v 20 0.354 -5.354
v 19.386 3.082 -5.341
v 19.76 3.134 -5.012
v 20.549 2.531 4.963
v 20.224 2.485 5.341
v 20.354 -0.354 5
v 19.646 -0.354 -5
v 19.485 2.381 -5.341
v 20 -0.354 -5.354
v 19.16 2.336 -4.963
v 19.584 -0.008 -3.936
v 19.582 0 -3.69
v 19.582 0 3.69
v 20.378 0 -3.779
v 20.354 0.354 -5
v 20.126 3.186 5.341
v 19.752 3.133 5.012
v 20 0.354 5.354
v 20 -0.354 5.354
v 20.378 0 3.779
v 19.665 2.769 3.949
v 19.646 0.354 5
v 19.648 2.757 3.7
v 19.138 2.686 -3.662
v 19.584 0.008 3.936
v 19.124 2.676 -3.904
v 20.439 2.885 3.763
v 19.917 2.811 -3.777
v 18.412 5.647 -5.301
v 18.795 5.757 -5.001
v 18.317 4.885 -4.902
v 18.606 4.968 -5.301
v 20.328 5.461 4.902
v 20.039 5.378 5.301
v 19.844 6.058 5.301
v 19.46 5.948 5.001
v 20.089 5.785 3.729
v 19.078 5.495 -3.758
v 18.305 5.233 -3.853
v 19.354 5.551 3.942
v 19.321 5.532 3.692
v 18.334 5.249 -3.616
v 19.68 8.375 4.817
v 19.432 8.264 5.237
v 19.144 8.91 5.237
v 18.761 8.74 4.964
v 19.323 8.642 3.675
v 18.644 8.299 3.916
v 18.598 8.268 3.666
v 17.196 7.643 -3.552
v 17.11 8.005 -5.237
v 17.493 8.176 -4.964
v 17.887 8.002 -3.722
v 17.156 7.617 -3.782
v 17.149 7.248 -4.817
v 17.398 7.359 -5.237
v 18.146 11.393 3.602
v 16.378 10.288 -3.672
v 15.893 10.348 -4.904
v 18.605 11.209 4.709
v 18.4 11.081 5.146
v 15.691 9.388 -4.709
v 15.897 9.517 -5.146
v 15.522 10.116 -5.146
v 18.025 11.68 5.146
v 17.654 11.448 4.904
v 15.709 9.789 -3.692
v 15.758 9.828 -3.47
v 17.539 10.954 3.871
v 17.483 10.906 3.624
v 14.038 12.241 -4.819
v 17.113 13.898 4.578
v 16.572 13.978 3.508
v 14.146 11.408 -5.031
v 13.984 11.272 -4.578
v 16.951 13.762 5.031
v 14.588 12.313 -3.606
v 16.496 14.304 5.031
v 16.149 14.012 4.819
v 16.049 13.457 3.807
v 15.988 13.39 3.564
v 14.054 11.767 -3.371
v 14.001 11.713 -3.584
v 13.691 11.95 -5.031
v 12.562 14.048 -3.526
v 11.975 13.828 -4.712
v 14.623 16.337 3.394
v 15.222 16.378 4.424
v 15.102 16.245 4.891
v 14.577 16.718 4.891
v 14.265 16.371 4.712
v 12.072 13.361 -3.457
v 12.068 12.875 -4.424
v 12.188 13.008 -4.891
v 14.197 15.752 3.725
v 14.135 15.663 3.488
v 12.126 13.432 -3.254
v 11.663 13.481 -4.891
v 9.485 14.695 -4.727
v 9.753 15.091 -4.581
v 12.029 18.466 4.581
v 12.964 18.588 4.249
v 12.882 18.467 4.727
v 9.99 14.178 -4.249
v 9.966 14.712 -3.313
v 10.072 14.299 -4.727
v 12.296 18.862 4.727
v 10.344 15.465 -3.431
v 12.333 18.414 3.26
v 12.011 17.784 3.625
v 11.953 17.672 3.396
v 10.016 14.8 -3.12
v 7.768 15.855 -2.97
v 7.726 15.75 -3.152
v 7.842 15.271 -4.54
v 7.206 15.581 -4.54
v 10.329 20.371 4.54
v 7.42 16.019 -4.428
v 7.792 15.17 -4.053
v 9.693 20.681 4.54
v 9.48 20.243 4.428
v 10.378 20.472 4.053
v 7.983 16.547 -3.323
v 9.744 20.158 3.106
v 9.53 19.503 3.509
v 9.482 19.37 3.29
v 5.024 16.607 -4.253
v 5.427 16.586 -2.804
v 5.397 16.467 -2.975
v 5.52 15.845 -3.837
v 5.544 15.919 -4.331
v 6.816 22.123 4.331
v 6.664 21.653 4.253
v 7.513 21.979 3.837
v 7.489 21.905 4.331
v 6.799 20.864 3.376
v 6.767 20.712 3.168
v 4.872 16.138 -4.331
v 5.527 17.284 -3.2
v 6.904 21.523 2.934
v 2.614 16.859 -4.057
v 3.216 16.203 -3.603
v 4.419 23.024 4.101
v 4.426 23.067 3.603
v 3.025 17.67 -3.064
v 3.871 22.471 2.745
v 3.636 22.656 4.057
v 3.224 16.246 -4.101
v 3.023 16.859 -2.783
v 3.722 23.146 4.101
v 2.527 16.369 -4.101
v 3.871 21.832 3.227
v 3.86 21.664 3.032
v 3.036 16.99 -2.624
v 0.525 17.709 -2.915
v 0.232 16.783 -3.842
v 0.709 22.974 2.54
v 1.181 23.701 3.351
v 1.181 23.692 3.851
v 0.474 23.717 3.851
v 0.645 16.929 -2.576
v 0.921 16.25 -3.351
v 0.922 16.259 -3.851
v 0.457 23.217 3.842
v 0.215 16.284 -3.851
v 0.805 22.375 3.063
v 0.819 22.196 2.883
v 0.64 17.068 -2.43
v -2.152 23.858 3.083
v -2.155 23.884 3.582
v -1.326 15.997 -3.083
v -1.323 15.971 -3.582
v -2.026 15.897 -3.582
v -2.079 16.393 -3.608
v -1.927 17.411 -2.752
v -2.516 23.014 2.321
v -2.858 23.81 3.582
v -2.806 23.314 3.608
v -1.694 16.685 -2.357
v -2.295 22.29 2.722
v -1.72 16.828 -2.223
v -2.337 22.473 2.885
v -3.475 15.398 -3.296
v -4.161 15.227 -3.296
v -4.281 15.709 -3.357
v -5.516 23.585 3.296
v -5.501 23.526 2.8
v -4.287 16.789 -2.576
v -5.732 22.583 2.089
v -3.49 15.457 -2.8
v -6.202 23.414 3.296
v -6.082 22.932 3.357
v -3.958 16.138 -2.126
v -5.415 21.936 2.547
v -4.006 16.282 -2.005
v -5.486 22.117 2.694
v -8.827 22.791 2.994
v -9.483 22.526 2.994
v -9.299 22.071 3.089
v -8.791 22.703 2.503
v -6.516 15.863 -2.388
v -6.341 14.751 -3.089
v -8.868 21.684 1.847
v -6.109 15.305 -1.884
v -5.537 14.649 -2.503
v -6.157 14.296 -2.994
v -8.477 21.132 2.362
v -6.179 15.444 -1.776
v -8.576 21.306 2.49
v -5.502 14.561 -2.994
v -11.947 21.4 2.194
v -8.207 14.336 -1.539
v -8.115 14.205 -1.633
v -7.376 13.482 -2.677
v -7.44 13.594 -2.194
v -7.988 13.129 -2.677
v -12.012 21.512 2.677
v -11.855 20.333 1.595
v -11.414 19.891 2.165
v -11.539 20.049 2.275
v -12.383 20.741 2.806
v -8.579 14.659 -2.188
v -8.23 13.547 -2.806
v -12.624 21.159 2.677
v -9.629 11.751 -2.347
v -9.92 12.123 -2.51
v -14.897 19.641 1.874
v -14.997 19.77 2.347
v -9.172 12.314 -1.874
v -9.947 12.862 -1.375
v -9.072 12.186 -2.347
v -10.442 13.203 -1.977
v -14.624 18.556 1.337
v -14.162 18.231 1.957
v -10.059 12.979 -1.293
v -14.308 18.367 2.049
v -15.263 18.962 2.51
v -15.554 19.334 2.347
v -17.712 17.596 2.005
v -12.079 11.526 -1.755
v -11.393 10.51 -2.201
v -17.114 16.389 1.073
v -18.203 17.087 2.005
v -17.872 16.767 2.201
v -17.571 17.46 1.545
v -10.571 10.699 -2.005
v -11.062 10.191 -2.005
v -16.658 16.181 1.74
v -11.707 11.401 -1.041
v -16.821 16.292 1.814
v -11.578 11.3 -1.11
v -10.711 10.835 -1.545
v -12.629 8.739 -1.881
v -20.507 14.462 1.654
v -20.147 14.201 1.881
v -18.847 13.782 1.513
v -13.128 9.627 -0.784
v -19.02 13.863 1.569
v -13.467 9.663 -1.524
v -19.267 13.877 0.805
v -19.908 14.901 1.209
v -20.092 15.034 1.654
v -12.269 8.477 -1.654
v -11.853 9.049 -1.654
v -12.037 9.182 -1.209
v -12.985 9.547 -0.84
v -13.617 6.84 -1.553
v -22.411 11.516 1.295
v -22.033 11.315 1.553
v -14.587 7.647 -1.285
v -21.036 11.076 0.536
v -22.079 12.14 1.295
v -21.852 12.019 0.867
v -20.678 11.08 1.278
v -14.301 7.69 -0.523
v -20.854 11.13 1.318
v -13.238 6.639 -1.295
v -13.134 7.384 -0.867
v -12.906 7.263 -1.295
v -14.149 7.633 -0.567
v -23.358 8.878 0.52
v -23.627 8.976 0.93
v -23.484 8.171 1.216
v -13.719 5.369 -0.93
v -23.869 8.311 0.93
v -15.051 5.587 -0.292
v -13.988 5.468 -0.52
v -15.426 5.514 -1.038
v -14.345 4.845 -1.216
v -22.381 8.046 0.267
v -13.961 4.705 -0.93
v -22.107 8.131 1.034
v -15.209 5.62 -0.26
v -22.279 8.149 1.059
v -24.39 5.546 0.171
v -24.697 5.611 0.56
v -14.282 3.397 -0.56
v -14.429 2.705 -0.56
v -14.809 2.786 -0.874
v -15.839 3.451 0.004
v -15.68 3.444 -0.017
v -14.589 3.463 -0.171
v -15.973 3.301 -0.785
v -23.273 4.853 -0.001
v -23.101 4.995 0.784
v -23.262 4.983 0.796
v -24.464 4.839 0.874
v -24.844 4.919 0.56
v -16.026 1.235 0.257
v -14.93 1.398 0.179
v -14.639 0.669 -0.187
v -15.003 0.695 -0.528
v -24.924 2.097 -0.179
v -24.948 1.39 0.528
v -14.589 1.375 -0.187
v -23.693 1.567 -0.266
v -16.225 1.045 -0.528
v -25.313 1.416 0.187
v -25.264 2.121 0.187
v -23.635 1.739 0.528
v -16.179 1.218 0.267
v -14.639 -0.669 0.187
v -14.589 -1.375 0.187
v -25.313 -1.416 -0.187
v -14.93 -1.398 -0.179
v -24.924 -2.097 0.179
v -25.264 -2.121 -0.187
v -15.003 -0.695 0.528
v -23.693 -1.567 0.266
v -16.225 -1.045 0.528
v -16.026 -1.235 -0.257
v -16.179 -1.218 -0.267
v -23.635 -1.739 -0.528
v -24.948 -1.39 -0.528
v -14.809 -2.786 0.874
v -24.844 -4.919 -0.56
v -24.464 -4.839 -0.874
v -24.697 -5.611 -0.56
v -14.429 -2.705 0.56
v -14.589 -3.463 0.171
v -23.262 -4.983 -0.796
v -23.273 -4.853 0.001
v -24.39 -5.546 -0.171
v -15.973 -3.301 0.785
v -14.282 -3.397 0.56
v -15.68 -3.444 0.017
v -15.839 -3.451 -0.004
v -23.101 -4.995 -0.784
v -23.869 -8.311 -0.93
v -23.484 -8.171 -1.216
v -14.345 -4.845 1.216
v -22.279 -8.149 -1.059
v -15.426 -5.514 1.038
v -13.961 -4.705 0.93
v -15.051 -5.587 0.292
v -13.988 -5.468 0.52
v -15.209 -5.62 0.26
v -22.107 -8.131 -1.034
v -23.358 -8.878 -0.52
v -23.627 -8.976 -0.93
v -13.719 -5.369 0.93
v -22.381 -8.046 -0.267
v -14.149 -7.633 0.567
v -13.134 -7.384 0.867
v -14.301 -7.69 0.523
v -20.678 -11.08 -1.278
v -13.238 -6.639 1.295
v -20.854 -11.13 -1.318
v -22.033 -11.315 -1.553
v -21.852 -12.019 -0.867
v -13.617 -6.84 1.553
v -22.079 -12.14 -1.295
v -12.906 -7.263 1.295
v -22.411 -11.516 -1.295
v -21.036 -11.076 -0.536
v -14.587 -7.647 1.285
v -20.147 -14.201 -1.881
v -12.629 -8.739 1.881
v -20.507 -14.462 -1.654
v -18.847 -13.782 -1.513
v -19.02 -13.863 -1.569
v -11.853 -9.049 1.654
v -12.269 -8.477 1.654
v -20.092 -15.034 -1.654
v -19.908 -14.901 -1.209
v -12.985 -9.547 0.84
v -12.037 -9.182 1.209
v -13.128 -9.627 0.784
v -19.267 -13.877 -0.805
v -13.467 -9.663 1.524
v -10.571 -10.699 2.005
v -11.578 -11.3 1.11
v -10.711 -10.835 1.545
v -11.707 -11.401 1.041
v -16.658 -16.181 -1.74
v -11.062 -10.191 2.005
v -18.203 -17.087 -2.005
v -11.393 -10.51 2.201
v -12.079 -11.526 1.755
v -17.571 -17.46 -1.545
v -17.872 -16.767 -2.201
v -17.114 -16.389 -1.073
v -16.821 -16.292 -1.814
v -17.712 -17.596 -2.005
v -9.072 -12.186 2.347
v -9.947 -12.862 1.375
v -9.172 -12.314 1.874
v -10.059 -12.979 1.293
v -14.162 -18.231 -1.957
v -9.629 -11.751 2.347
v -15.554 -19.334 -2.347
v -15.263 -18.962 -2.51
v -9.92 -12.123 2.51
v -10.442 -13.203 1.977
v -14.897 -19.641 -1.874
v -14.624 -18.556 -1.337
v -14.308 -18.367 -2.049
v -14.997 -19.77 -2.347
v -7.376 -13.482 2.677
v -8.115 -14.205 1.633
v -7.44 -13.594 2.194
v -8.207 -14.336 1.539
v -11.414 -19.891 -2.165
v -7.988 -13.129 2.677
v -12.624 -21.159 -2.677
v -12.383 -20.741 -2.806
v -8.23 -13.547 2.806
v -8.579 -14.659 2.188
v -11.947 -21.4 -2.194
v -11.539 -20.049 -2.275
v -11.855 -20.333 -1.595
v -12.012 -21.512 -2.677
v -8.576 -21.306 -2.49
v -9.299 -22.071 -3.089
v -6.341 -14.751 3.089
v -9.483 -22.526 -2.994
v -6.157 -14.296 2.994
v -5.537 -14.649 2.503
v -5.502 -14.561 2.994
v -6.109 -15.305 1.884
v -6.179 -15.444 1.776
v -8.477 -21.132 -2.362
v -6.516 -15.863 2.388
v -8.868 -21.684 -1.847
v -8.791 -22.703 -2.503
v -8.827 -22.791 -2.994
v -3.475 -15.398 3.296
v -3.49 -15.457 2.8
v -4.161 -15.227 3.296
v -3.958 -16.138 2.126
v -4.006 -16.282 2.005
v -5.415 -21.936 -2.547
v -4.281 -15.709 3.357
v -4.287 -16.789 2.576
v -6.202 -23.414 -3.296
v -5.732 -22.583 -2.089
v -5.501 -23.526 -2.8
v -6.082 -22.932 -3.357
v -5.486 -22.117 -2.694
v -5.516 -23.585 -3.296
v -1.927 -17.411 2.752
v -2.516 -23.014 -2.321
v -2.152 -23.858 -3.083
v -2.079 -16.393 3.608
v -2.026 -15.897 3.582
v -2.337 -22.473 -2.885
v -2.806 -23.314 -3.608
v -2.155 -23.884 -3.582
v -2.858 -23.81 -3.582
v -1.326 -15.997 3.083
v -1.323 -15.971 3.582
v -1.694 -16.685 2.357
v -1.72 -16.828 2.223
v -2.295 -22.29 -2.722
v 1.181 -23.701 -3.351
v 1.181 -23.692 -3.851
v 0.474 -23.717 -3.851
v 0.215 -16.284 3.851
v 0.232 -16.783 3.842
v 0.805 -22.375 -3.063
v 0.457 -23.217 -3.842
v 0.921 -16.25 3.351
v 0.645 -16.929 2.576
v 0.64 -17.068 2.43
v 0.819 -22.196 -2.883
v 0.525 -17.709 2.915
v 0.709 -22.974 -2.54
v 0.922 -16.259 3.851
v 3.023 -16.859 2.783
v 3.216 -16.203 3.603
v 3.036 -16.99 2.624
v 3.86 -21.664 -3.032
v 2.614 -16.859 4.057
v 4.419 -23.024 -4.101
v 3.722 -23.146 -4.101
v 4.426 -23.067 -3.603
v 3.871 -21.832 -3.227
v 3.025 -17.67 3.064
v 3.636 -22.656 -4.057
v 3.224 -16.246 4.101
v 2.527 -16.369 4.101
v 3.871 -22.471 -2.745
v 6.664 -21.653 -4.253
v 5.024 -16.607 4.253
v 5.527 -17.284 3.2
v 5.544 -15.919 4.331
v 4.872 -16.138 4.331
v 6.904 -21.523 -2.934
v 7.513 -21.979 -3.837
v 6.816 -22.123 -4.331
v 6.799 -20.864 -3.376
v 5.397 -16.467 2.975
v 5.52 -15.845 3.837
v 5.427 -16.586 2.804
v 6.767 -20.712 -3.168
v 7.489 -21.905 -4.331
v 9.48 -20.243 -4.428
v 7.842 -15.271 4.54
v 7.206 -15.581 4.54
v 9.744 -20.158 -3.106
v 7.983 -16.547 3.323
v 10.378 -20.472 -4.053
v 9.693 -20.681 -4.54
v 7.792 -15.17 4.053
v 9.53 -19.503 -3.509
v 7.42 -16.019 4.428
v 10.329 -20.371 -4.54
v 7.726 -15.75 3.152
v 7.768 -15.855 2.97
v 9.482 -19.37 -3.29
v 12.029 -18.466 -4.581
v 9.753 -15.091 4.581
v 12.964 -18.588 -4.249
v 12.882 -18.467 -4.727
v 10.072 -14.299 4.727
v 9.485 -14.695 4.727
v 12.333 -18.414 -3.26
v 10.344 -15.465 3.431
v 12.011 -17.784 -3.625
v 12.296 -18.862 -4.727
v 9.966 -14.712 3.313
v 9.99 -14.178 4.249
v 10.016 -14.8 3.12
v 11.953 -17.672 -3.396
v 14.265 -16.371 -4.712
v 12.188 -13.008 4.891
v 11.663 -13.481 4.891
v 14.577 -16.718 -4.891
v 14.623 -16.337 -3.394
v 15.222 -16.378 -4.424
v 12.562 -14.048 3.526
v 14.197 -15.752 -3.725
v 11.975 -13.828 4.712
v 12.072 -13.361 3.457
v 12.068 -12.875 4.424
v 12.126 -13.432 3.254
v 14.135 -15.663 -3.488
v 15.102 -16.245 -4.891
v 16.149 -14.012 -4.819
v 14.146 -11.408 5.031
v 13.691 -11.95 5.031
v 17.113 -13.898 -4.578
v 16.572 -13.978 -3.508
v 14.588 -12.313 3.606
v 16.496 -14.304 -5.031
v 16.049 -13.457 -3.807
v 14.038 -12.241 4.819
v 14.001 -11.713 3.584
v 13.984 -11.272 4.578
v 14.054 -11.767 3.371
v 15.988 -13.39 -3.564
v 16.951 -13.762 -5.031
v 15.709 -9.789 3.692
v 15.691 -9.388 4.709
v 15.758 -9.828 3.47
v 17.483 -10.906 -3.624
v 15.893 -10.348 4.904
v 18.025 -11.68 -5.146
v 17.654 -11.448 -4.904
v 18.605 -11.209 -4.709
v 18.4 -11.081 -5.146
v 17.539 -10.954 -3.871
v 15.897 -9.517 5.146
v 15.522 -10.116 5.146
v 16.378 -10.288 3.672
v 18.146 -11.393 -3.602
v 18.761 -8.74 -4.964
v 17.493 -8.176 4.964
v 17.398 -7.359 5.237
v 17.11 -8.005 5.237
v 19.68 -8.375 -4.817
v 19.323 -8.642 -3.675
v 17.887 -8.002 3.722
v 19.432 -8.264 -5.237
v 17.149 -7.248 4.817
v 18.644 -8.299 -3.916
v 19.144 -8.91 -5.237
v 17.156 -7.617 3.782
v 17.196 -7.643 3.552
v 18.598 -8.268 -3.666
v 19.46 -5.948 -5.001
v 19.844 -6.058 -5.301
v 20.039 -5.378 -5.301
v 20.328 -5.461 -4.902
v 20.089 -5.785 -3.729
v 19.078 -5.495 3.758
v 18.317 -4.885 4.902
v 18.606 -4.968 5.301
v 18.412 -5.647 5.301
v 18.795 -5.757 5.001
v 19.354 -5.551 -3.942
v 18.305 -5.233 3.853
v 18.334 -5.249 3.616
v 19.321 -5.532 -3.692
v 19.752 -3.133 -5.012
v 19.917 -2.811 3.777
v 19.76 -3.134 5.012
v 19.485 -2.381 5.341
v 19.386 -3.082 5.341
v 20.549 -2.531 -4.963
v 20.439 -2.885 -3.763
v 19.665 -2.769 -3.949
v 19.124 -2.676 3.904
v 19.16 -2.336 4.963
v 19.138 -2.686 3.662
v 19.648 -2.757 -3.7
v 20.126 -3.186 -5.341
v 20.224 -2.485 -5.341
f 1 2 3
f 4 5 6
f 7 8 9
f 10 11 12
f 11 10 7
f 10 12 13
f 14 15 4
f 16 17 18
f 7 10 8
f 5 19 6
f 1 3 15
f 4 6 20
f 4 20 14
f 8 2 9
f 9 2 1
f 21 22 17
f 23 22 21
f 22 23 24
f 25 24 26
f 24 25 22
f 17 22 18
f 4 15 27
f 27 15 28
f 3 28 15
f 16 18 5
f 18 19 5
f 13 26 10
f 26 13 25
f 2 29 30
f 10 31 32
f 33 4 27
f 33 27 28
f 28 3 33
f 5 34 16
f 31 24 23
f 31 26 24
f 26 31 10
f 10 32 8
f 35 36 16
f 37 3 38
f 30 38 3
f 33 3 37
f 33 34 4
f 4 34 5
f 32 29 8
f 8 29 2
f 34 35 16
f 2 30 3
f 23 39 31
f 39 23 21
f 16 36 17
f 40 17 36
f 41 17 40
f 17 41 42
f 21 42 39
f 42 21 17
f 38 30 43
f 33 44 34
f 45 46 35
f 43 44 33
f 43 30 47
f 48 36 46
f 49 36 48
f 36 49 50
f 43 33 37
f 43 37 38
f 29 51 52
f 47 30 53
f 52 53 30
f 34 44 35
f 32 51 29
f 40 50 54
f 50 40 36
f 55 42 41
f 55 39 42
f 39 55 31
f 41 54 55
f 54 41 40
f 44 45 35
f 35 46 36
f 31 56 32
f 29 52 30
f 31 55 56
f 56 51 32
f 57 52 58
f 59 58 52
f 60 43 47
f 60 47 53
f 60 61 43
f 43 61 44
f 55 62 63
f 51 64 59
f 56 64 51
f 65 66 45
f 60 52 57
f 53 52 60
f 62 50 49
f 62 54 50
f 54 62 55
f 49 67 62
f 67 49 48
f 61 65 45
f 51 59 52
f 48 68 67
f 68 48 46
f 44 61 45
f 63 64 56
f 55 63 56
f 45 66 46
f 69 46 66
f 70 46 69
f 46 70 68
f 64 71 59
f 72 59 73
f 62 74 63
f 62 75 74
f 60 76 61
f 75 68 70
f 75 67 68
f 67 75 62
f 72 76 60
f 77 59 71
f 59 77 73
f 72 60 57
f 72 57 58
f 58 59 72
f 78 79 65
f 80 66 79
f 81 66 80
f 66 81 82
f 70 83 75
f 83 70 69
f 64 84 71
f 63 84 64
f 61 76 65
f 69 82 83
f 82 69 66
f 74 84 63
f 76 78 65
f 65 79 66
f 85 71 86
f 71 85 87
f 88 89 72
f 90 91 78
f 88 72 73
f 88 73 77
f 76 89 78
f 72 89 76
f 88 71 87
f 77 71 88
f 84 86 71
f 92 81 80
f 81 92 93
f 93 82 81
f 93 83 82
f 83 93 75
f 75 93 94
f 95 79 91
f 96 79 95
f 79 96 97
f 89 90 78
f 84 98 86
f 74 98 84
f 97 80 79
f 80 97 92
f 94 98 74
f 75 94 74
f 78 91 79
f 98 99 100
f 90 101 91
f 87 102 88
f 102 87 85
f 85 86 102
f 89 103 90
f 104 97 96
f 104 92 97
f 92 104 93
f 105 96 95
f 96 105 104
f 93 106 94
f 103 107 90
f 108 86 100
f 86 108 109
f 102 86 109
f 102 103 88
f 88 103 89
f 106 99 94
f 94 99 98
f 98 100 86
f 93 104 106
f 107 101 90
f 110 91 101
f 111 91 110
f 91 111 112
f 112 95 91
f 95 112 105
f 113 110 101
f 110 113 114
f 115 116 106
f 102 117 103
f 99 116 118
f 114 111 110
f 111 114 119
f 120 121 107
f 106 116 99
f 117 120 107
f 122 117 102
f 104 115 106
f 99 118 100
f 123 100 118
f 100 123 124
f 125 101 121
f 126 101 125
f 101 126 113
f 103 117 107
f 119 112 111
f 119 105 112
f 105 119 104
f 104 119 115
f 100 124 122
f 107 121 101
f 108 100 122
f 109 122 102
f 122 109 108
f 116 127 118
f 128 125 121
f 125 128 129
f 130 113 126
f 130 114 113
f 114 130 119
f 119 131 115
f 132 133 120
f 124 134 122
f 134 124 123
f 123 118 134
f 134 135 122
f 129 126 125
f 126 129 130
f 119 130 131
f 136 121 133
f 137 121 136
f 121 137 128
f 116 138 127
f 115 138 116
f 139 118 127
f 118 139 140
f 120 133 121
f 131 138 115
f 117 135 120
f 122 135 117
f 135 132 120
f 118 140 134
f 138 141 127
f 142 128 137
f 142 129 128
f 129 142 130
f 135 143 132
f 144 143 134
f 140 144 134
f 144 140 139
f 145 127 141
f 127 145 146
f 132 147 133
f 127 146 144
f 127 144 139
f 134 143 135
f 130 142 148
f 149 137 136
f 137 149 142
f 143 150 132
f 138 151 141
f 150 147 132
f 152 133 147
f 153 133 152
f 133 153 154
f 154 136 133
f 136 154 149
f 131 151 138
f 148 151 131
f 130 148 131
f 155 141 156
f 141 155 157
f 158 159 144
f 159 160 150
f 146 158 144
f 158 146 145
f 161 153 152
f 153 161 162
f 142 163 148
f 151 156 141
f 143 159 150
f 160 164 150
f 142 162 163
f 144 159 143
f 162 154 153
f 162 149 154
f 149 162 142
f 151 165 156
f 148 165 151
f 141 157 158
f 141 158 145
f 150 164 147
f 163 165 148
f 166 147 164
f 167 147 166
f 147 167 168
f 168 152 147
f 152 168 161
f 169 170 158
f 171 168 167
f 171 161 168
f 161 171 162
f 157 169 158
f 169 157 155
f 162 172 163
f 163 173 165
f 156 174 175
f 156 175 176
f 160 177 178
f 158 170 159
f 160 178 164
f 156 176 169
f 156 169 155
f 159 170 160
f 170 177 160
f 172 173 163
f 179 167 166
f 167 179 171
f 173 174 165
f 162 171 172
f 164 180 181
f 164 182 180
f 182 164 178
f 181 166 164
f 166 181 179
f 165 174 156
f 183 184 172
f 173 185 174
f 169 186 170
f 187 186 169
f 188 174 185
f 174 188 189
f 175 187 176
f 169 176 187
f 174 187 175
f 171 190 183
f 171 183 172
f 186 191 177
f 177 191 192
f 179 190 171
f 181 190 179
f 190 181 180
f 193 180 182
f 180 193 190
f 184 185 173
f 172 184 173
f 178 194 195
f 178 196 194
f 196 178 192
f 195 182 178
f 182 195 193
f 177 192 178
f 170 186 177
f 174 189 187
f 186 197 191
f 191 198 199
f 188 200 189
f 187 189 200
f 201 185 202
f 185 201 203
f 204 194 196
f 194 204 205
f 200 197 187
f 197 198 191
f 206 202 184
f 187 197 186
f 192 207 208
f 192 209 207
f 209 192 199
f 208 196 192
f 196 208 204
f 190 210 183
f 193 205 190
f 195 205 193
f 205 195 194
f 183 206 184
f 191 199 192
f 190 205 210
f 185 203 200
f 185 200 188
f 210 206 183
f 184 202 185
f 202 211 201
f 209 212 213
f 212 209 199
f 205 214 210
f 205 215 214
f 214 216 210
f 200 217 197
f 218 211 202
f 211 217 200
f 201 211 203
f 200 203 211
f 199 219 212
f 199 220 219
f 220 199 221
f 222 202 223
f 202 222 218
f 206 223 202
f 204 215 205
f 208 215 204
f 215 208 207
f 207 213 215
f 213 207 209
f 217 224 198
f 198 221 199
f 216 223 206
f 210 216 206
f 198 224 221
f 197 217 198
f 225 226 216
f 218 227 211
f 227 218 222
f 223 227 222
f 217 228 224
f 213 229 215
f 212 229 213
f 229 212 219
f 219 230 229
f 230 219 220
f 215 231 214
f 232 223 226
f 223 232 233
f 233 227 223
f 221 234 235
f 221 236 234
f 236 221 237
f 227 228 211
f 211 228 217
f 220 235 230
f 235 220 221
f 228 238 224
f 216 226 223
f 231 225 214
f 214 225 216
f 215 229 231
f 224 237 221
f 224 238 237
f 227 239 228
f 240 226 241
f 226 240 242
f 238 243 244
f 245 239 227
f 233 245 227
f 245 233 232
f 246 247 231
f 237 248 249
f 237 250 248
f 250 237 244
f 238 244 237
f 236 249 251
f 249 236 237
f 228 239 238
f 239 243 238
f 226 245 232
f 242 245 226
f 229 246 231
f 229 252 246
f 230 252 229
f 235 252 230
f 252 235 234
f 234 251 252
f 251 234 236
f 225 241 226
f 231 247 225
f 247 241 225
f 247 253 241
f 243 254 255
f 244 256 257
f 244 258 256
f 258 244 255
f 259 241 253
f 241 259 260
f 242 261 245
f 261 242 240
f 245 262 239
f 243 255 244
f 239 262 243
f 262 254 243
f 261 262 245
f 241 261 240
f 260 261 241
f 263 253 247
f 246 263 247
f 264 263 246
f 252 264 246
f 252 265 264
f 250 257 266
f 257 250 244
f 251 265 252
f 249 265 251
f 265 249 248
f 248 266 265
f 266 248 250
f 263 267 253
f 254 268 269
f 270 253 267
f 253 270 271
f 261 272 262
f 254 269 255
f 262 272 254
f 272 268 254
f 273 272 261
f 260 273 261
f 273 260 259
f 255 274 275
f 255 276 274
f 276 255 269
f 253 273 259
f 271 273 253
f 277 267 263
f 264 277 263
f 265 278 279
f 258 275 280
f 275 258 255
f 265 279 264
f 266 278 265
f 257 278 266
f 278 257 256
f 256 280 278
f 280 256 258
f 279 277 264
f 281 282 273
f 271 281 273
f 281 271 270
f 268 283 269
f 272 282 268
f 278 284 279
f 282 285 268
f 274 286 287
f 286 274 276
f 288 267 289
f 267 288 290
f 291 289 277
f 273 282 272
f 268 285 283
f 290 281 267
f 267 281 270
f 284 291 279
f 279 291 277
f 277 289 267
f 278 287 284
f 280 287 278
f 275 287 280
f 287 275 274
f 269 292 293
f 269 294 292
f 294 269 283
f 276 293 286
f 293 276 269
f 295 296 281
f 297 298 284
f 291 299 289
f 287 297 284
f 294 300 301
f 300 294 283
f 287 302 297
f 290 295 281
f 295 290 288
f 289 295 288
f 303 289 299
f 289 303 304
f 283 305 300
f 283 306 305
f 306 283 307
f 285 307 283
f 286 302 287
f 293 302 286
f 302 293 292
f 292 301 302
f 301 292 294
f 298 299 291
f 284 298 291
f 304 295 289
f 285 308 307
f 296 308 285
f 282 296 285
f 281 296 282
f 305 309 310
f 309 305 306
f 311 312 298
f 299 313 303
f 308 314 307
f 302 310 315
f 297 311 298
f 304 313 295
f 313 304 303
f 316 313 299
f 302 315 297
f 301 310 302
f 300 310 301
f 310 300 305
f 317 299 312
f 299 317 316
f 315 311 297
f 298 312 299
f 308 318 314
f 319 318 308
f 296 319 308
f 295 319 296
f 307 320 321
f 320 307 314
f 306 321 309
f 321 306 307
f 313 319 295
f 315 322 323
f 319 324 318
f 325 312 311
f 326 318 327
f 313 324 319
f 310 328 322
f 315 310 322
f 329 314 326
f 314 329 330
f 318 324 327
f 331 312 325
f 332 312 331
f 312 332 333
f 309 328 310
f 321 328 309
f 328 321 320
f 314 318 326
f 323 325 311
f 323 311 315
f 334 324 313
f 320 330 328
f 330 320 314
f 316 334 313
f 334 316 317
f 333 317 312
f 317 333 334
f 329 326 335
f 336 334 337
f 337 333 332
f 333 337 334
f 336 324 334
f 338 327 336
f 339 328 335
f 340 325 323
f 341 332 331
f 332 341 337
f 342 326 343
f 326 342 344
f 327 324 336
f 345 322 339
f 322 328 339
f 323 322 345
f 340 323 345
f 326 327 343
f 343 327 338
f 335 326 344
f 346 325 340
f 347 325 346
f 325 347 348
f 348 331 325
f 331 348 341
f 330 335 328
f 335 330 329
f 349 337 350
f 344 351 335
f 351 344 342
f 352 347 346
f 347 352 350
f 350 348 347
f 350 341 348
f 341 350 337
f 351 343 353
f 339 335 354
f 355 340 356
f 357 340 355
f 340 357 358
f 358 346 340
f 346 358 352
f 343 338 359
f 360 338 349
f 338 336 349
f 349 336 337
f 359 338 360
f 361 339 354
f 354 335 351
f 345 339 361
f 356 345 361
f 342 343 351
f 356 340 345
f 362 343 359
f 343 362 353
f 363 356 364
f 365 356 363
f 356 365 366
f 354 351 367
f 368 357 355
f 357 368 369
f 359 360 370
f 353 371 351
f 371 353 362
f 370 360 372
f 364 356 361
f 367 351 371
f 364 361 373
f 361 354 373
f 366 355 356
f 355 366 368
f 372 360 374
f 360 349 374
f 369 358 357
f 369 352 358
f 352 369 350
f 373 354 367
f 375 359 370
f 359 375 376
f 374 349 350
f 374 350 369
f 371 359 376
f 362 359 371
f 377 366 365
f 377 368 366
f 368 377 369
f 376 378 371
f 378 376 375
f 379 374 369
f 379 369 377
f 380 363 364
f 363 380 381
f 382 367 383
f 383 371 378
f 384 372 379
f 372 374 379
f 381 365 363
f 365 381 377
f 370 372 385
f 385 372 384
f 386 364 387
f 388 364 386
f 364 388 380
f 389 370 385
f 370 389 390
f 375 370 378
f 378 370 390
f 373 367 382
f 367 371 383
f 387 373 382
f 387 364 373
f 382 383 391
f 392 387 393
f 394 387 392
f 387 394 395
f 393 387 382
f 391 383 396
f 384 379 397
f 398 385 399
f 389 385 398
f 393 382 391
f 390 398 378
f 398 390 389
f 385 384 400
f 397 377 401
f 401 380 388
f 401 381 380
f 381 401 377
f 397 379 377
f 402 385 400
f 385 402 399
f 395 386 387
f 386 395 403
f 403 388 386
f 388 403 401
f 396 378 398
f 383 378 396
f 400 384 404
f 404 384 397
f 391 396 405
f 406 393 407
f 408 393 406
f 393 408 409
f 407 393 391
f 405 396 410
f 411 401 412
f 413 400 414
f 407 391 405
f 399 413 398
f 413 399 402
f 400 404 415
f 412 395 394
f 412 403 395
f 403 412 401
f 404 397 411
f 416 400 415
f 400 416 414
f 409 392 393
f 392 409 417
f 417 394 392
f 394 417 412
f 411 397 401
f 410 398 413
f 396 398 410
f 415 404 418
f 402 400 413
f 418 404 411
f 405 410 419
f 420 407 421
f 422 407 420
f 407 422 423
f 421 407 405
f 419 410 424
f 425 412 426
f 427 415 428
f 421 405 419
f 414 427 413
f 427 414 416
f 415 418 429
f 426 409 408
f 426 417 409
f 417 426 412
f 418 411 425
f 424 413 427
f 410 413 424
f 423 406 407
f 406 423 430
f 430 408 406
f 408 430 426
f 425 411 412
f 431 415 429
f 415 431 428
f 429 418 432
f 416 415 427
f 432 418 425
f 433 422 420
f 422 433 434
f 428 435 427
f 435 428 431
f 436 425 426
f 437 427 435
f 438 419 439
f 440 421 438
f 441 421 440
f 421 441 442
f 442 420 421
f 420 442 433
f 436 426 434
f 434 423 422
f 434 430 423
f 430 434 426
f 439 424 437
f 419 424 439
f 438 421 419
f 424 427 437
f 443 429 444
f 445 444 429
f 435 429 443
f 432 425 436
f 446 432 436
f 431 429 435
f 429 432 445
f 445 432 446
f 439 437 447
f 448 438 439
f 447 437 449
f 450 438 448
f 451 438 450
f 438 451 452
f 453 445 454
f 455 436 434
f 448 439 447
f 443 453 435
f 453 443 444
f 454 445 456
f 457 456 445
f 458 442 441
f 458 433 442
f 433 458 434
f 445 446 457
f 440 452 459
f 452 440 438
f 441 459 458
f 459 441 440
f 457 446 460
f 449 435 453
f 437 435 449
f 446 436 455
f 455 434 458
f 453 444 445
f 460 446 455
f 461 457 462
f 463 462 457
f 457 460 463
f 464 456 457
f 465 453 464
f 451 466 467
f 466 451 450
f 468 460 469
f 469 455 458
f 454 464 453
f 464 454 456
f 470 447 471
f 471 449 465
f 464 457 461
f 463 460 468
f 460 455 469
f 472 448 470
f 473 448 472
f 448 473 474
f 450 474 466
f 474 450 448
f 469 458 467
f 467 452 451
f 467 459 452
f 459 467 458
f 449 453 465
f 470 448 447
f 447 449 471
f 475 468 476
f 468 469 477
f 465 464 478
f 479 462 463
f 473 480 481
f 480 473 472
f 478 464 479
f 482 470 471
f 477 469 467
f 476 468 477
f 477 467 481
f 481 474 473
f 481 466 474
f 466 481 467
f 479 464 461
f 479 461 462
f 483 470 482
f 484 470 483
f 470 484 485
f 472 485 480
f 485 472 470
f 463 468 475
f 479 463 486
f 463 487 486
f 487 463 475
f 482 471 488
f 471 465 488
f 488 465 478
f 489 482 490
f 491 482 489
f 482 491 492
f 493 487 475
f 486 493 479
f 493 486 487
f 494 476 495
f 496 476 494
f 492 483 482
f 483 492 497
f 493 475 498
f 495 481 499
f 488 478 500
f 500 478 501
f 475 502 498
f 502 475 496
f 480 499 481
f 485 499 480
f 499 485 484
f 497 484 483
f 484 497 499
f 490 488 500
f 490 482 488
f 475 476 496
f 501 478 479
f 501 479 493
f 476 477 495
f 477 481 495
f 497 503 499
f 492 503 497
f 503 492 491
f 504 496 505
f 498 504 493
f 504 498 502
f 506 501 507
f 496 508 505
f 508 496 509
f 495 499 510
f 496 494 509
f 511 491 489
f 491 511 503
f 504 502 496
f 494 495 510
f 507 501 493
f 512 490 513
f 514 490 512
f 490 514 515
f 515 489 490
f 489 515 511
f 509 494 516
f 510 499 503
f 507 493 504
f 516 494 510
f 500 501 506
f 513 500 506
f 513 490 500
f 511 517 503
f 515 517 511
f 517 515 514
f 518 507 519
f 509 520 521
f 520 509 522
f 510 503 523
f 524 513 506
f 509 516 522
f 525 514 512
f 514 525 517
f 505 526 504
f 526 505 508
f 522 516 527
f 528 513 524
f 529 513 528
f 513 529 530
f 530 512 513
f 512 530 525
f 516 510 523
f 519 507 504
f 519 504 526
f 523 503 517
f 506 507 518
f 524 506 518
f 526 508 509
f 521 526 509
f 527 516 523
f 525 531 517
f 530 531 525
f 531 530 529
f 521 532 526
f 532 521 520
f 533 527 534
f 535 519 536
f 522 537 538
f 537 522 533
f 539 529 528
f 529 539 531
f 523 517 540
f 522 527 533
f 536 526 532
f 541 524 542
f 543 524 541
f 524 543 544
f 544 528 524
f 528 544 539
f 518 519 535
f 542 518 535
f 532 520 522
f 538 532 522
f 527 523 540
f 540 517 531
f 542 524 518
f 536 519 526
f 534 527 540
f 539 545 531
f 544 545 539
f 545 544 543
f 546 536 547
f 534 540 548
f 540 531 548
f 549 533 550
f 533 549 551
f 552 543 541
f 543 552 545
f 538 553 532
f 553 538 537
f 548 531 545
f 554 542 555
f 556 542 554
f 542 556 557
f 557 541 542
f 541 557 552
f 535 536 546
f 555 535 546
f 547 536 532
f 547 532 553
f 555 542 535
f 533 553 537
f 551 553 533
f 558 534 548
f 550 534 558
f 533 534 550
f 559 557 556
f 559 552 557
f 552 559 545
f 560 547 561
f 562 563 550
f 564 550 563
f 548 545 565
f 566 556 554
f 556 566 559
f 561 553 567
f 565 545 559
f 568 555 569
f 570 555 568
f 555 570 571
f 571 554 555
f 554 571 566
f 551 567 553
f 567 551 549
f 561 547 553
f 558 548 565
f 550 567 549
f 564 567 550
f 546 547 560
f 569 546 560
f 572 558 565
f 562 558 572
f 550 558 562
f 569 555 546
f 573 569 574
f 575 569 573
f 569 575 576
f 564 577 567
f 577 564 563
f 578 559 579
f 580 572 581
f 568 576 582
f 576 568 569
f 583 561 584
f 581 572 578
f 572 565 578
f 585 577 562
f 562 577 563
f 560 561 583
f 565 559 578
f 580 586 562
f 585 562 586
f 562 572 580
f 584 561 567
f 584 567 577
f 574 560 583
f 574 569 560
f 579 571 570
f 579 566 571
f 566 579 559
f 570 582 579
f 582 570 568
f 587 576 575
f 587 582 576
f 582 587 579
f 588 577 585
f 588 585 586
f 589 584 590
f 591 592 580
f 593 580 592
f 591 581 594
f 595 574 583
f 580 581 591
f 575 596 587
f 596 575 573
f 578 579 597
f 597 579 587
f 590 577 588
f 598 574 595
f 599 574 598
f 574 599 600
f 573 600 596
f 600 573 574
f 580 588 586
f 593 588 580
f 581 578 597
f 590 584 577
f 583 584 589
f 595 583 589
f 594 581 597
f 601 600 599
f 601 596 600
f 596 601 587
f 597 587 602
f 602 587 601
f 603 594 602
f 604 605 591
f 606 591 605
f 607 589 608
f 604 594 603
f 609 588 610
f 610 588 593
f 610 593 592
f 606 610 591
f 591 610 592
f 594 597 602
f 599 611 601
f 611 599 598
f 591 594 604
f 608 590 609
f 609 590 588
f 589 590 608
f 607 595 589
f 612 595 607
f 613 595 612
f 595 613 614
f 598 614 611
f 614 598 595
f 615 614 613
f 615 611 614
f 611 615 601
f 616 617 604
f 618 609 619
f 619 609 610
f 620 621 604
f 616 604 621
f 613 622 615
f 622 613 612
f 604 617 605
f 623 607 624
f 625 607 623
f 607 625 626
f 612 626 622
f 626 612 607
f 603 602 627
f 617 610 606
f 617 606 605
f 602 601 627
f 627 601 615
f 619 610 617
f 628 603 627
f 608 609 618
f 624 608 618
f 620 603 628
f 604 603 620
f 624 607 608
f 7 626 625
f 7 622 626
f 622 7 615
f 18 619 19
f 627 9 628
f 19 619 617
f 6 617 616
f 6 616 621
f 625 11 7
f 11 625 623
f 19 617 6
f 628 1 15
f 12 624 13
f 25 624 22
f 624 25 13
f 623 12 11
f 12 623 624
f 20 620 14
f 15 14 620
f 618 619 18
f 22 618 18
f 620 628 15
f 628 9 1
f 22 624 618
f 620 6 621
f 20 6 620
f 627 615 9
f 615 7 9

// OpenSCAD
//
//        __    
//       /\ \            Moebius v2 by 
//      / /\ \           Vanlindt Marc
//     / /  \ \          Licence GNU GPL V3
//    / /____\_\ 
//    \/_______/ 
//
//

nombresections 		= 45;	// nombre de divisions de la forme
rayon 			= 10;	// Rayon...
nbrcotes 		= 2;		// Nombre de côtés de la forme
tours                   = 1;	// Nombre de tours effectués.




//Exemples : (décommentez la ligne de l'exemple voulu)
//nombresections=90;rayon=10;nbrcotes=4;nbrtour=1/2;
//nombresections=180;rayon=12;nbrcotes=4;nbrtour=2;
//nombresections=360;rayon=12;nbrcotes=4;nbrtour=4;
//nombresections=30;rayon=10;nbrcotes=3;nbrtour=1/3;
//nombresections=30;rayon=10;nbrcotes=3;nbrtour=1/3;
//nombresections=45;rayon=5;nbrcotes=5;nbrtour=3/5;


nbrtour 		= tours/nbrcotes;
moebius();



module moebius()
{
    union()
    {
    	for (i=[0:nombresections])
        {
            union()
            {
                hull()
            	{
                    rotate ([0,0,i*360/nombresections])
                    translate ([20,0,0])
                    rotate([90,i*360*nbrtour/nombresections,0])
                    for(i=[1:nbrcotes])
                    {
                        rotate([0,0,360/nbrcotes*i])
                        translate([0,rayon/2,0])
                        sphere(d=1,$fn=4);
                    }
                    rotate ([0,0,(i+1)*360/nombresections])
                    translate ([20,0,0])
                    rotate([90,(i+1)*360*nbrtour/nombresections,0])
                    for(i=[1:nbrcotes])
                    {
                        rotate([0,0,360/nbrcotes*i])
                        translate([0,rayon/2,0])
                        sphere(d=1,$fn=4);
                    }
                }
            }
        }
    }
}
